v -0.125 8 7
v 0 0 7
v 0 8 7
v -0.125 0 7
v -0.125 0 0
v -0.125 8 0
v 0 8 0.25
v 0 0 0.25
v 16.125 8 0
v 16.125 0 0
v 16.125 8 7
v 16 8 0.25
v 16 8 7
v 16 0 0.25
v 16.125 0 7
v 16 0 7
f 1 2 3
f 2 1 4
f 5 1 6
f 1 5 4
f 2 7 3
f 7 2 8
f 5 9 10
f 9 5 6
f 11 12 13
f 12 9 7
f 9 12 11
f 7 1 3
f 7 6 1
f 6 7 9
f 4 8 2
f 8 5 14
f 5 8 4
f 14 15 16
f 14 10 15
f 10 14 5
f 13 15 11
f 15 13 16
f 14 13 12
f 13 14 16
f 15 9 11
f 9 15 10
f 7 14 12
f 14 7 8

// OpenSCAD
// dimensions
wid = 16;
dep = 8;
hgt = 7;

fb_hgt = 5;

base_thk = 0.25;
side_thk = 0.125;

// bottom
color("brown") cube( [wid, dep, base_thk]);

// ends
rotate( [0, 270, 0]) {
     color("peru") cube( [hgt, dep, side_thk]);
     translate( [0, 0, -(wid+side_thk) ])
     color("peru") cube( [hgt, dep, side_thk]);
}

rotate( [90, 0, 0]) {
     translate( [-side_thk, 0, 0])
     %cube( [wid+2*side_thk, fb_hgt, side_thk]);
     translate( [-side_thk, 0, -(dep+side_thk) ])
     %cube( [wid+2*side_thk, fb_hgt, side_thk]);
}

translate( [-side_thk, 0, hgt])
 %cube( [wid+2*side_thk, dep, side_thk]);
